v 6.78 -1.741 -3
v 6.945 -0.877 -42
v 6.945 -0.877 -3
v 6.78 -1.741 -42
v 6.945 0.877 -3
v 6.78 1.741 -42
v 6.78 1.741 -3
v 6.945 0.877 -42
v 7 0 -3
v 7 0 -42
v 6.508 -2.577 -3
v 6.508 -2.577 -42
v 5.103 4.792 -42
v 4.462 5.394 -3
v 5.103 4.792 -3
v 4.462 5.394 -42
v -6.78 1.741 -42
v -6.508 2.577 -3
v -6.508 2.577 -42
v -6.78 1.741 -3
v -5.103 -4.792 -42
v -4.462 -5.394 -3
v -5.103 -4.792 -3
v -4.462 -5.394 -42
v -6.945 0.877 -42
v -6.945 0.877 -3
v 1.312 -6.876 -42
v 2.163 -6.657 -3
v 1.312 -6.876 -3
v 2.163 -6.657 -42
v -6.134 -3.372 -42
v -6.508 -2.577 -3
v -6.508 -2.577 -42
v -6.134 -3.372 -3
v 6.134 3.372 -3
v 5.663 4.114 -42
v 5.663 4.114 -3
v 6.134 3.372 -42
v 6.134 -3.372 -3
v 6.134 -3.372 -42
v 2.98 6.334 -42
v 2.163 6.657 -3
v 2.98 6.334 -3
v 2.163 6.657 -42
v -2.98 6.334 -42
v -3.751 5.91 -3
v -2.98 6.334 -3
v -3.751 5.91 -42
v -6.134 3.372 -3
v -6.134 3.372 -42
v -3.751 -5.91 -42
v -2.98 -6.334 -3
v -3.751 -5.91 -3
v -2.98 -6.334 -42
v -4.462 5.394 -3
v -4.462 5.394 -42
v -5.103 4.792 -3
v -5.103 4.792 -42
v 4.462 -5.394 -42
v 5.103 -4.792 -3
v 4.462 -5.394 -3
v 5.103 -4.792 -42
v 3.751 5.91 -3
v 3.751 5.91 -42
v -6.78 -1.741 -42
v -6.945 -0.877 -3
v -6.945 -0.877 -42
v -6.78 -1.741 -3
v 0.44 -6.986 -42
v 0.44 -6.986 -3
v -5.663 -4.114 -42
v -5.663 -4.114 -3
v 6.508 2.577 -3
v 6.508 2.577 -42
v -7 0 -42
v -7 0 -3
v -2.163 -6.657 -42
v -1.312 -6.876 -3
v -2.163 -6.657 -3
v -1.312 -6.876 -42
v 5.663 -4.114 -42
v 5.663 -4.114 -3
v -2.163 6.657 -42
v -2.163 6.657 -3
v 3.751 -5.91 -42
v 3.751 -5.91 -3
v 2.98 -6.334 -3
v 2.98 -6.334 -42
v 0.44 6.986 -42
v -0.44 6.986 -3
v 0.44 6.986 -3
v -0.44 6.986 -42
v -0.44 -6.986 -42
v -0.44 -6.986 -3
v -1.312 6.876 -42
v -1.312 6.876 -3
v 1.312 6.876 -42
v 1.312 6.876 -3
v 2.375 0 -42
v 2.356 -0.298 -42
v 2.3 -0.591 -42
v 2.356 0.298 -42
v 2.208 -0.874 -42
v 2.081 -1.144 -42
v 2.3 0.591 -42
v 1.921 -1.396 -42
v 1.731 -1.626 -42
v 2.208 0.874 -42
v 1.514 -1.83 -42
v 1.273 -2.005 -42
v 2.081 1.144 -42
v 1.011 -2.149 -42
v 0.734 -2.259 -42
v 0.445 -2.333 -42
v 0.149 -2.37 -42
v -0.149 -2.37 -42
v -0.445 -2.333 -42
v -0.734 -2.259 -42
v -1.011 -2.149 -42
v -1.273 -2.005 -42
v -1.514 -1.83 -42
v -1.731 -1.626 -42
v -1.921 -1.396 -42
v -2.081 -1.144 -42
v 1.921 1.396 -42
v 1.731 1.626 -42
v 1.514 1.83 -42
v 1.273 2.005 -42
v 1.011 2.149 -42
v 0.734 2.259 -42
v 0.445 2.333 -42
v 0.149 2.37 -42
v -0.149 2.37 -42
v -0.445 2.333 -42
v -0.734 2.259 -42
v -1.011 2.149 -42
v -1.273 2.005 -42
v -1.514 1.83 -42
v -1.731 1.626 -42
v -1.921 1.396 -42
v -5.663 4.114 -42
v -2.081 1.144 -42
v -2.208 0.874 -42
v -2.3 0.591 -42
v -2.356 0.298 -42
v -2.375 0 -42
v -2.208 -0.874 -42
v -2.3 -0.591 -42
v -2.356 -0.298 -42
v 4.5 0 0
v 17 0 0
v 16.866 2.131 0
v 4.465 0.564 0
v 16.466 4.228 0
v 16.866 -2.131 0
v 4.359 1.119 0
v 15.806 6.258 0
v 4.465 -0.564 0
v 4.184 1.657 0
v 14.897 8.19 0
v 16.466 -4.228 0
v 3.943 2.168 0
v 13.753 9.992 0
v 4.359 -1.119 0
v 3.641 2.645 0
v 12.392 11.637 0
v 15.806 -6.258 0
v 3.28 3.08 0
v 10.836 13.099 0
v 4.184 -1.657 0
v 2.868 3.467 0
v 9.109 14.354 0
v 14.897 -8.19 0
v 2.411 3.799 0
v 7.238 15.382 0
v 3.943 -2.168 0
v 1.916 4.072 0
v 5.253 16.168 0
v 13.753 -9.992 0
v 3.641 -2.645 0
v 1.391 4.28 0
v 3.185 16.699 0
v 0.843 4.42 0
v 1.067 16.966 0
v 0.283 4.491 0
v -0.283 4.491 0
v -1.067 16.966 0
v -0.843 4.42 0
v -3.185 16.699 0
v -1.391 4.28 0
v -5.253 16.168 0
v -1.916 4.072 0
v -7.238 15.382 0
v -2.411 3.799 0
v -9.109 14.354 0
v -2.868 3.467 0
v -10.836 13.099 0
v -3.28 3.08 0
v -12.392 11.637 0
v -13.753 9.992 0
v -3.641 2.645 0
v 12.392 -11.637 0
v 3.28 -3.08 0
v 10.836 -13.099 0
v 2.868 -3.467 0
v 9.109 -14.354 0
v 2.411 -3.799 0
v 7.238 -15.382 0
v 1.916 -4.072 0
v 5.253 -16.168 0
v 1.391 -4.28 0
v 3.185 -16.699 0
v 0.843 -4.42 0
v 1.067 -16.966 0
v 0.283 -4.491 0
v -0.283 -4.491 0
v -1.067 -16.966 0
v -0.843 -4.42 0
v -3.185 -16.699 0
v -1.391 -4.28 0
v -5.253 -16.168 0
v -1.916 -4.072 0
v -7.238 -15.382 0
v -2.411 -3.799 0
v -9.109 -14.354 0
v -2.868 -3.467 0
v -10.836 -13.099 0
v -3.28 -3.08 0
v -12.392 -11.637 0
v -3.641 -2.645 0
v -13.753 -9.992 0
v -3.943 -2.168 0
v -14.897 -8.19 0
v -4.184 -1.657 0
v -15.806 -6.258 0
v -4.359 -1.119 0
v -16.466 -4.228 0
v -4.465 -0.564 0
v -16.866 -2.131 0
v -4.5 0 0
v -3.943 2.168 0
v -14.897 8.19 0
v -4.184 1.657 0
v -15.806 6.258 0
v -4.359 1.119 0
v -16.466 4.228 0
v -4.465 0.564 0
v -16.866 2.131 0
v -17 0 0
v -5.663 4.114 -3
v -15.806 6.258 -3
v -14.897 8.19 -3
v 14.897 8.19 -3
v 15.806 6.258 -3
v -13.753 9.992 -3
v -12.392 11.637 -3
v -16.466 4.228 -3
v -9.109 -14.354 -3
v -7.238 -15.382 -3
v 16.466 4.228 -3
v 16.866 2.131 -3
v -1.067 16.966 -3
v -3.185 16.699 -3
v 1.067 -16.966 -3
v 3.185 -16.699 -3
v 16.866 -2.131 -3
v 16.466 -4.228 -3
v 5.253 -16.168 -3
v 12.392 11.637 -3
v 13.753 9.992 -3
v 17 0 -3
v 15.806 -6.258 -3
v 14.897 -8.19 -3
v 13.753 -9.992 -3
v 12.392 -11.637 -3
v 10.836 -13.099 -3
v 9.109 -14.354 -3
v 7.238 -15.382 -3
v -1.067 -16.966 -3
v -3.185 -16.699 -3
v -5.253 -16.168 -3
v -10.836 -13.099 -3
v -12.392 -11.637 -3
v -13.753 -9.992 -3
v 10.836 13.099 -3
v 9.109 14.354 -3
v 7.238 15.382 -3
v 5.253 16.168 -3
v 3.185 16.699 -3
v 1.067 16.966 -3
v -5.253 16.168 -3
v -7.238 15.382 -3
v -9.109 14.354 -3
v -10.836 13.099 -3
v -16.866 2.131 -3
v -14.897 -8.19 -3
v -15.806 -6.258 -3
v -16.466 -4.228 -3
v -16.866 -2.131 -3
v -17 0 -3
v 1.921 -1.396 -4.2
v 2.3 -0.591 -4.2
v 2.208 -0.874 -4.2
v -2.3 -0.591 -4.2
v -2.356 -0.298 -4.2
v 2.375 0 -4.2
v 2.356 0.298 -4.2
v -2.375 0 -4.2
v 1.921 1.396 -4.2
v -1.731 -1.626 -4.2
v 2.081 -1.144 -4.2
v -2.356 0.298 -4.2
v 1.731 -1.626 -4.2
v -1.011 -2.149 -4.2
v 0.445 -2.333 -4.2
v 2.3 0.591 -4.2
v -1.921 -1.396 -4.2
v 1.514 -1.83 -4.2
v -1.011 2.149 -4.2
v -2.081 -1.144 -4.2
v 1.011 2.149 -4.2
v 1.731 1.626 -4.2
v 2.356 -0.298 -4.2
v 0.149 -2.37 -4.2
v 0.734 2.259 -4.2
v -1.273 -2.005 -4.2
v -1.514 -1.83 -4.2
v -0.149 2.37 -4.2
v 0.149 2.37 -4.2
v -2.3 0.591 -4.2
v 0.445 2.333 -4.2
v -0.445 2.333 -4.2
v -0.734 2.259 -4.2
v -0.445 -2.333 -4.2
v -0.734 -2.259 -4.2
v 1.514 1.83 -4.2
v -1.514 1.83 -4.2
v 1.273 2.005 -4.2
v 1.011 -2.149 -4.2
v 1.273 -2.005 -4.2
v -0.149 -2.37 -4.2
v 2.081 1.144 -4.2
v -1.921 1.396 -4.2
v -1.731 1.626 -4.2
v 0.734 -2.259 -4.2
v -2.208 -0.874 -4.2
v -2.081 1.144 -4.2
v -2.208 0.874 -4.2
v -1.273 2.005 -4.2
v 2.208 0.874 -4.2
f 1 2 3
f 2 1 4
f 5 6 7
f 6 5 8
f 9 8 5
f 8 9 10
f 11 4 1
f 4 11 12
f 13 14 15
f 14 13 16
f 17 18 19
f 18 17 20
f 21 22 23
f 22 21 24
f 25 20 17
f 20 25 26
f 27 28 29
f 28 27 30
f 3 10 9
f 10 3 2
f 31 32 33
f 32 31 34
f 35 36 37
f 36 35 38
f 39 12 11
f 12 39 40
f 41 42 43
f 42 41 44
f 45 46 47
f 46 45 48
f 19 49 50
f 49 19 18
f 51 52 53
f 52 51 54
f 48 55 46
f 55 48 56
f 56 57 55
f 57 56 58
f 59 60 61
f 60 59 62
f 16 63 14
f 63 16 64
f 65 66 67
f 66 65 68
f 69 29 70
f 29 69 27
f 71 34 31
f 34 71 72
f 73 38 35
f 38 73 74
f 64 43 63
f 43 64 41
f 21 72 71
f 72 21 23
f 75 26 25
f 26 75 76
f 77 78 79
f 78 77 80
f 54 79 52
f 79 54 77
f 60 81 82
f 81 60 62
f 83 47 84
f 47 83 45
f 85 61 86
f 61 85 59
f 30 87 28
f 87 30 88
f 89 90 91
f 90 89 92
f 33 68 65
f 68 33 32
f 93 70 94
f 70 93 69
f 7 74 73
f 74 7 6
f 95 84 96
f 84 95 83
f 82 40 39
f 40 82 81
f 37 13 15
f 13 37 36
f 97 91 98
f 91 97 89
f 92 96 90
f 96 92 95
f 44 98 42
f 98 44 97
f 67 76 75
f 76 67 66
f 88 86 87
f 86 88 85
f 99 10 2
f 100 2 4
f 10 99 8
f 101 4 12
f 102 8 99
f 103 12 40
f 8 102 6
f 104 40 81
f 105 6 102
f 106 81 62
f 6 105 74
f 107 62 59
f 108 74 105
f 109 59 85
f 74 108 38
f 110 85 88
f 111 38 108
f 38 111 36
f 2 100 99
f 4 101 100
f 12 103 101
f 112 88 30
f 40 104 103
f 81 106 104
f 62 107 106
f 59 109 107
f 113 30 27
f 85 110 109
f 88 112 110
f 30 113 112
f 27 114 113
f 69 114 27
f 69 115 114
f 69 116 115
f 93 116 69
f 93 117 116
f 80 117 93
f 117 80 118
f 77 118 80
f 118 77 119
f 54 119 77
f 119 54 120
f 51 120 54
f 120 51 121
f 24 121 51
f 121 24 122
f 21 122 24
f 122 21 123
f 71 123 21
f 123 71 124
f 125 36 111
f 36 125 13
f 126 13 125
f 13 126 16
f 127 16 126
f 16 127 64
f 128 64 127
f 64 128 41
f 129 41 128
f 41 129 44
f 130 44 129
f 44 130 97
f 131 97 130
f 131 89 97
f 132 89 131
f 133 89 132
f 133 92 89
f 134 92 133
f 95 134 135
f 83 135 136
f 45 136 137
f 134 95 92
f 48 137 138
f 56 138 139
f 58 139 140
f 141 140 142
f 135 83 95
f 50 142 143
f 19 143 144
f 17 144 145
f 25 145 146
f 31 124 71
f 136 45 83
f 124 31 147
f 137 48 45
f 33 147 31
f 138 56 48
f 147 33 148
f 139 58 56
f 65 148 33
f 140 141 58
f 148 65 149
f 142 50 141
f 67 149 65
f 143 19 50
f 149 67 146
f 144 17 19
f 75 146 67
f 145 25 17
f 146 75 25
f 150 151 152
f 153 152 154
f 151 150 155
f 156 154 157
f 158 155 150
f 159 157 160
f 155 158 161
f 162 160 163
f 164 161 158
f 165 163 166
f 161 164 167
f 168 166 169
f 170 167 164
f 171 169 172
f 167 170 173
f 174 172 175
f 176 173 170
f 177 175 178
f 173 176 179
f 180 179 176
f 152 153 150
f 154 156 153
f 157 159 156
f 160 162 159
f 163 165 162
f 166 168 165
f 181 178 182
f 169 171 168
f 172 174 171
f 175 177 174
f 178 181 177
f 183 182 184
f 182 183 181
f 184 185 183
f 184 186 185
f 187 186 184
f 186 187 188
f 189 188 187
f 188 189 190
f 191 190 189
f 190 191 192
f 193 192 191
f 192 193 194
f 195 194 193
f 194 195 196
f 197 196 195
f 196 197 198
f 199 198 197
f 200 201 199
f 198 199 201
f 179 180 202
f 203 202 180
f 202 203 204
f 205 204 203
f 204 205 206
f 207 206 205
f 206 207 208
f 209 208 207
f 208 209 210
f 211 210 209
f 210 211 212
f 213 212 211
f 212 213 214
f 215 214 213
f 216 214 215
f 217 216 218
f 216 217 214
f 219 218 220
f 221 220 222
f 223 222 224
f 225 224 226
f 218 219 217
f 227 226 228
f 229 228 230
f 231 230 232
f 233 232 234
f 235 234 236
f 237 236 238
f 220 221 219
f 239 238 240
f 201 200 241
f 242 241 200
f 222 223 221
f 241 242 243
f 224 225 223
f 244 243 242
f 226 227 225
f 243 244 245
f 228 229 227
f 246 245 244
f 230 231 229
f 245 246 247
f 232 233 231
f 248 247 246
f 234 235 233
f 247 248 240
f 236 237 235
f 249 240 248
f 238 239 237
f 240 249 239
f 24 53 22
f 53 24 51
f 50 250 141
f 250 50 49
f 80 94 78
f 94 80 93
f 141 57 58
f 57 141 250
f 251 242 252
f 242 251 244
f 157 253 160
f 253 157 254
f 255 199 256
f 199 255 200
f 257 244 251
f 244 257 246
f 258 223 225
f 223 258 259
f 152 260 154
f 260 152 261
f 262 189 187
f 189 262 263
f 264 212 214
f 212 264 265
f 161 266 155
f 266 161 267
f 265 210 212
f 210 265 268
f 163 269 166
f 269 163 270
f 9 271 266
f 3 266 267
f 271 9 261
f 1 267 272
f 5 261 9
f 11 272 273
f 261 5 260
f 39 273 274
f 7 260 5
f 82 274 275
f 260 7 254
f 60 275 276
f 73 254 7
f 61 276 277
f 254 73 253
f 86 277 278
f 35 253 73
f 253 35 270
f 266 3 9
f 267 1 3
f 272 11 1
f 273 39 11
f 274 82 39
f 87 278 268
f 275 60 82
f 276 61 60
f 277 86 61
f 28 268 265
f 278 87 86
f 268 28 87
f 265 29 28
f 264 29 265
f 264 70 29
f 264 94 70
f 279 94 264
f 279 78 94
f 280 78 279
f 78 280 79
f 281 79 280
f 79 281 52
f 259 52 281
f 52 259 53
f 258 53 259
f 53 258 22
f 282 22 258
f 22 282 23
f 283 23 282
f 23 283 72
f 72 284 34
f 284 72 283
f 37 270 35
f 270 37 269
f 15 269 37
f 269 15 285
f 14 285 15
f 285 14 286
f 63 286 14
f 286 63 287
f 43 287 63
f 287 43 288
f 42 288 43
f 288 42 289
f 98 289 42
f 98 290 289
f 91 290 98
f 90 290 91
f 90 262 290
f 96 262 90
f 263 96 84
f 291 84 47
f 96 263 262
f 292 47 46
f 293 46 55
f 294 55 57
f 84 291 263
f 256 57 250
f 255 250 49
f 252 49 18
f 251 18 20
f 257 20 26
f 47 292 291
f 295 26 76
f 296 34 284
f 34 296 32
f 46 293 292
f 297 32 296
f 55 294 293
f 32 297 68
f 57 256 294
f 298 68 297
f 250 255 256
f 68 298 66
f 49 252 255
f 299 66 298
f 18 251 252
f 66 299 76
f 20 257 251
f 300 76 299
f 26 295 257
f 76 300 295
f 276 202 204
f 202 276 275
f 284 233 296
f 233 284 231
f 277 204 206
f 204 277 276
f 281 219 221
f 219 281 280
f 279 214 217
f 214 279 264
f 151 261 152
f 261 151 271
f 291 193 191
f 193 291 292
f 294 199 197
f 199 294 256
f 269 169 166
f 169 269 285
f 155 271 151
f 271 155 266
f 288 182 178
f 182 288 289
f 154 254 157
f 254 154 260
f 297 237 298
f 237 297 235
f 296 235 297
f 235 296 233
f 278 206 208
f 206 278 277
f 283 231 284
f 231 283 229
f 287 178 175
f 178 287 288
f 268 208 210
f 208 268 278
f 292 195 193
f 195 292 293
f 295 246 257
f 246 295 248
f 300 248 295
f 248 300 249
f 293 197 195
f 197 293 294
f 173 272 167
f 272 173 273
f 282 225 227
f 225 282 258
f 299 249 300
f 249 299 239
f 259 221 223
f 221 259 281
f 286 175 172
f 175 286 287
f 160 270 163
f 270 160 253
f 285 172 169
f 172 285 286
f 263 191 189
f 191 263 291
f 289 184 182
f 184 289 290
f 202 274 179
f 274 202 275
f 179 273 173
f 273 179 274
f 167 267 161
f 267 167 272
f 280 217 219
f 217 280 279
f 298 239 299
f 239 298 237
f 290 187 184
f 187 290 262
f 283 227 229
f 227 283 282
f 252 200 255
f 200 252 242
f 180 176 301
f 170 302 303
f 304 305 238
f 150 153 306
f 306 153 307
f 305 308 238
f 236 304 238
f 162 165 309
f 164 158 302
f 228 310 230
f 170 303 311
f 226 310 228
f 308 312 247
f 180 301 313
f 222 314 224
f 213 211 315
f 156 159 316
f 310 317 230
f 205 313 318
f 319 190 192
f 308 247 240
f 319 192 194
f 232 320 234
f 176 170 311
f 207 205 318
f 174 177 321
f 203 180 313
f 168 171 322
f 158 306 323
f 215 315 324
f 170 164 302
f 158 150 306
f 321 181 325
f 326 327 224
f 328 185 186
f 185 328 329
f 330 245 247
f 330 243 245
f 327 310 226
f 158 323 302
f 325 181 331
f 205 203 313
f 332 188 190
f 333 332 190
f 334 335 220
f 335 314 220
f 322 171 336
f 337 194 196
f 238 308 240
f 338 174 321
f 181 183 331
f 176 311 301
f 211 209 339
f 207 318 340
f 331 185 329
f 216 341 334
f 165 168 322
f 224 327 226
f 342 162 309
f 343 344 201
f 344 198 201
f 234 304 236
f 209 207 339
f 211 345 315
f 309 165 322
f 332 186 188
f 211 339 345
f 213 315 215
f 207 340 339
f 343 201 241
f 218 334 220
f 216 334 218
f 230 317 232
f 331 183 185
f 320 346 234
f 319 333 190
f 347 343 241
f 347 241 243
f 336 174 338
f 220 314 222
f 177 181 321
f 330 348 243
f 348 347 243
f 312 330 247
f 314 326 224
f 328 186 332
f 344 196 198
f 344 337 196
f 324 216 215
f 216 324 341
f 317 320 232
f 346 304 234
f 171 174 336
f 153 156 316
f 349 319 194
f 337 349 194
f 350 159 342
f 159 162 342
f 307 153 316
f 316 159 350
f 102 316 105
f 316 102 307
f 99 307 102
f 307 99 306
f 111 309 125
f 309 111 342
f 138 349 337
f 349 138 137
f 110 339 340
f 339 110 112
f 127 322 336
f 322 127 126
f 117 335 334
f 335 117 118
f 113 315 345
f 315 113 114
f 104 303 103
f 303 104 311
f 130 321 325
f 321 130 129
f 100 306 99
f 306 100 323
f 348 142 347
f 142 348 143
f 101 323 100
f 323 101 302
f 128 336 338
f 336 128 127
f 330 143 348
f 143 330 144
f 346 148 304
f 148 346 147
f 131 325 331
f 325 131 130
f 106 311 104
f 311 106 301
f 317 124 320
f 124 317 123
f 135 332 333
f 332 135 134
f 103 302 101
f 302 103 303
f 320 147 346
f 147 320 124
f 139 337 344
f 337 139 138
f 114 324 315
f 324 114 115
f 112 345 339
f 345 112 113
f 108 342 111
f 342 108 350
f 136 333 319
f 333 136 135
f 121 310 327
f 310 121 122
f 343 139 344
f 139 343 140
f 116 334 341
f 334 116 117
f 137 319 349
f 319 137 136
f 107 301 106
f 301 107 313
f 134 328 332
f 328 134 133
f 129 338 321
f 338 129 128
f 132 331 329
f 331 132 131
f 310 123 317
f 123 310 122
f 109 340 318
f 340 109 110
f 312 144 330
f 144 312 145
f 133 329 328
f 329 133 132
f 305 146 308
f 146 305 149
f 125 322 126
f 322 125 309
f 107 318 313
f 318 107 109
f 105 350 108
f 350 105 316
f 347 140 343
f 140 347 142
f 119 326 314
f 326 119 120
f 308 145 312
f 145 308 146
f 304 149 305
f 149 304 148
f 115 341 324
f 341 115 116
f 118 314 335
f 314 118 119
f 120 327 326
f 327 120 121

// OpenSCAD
$fn = 50;


difference() {
	union() {
		translate(v = [0, 0, -42.0000000000]) {
			cylinder(h = 42, r = 7.0000000000);
		}
		translate(v = [0, 0, -3.0000000000]) {
			cylinder(h = 3, r = 17.0000000000);
		}
	}
	union() {
		translate(v = [0, 0, 0]) {
			rotate(a = [0, 0, 0]) {
				difference() {
					union() {
						#translate(v = [0, 0, -42.0000000000]) {
							cylinder(h = 42, r = 2.2500000000);
						}
						#translate(v = [0, 0, -4.2000000000]) {
							cylinder(h = 4.2000000000, r = 7.0000000000, r1 = 2.3750000000, r2 = 4.5000000000);
						}
						#translate(v = [0, 0, -42.0000000000]) {
							cylinder(h = 42, r = 2.3750000000);
						}
						#translate(v = [0, 0, -42.0000000000]) {
							cylinder(h = 42, r = 2.2500000000);
						}
					}
					union();
				}
			}
		}
	}
}
